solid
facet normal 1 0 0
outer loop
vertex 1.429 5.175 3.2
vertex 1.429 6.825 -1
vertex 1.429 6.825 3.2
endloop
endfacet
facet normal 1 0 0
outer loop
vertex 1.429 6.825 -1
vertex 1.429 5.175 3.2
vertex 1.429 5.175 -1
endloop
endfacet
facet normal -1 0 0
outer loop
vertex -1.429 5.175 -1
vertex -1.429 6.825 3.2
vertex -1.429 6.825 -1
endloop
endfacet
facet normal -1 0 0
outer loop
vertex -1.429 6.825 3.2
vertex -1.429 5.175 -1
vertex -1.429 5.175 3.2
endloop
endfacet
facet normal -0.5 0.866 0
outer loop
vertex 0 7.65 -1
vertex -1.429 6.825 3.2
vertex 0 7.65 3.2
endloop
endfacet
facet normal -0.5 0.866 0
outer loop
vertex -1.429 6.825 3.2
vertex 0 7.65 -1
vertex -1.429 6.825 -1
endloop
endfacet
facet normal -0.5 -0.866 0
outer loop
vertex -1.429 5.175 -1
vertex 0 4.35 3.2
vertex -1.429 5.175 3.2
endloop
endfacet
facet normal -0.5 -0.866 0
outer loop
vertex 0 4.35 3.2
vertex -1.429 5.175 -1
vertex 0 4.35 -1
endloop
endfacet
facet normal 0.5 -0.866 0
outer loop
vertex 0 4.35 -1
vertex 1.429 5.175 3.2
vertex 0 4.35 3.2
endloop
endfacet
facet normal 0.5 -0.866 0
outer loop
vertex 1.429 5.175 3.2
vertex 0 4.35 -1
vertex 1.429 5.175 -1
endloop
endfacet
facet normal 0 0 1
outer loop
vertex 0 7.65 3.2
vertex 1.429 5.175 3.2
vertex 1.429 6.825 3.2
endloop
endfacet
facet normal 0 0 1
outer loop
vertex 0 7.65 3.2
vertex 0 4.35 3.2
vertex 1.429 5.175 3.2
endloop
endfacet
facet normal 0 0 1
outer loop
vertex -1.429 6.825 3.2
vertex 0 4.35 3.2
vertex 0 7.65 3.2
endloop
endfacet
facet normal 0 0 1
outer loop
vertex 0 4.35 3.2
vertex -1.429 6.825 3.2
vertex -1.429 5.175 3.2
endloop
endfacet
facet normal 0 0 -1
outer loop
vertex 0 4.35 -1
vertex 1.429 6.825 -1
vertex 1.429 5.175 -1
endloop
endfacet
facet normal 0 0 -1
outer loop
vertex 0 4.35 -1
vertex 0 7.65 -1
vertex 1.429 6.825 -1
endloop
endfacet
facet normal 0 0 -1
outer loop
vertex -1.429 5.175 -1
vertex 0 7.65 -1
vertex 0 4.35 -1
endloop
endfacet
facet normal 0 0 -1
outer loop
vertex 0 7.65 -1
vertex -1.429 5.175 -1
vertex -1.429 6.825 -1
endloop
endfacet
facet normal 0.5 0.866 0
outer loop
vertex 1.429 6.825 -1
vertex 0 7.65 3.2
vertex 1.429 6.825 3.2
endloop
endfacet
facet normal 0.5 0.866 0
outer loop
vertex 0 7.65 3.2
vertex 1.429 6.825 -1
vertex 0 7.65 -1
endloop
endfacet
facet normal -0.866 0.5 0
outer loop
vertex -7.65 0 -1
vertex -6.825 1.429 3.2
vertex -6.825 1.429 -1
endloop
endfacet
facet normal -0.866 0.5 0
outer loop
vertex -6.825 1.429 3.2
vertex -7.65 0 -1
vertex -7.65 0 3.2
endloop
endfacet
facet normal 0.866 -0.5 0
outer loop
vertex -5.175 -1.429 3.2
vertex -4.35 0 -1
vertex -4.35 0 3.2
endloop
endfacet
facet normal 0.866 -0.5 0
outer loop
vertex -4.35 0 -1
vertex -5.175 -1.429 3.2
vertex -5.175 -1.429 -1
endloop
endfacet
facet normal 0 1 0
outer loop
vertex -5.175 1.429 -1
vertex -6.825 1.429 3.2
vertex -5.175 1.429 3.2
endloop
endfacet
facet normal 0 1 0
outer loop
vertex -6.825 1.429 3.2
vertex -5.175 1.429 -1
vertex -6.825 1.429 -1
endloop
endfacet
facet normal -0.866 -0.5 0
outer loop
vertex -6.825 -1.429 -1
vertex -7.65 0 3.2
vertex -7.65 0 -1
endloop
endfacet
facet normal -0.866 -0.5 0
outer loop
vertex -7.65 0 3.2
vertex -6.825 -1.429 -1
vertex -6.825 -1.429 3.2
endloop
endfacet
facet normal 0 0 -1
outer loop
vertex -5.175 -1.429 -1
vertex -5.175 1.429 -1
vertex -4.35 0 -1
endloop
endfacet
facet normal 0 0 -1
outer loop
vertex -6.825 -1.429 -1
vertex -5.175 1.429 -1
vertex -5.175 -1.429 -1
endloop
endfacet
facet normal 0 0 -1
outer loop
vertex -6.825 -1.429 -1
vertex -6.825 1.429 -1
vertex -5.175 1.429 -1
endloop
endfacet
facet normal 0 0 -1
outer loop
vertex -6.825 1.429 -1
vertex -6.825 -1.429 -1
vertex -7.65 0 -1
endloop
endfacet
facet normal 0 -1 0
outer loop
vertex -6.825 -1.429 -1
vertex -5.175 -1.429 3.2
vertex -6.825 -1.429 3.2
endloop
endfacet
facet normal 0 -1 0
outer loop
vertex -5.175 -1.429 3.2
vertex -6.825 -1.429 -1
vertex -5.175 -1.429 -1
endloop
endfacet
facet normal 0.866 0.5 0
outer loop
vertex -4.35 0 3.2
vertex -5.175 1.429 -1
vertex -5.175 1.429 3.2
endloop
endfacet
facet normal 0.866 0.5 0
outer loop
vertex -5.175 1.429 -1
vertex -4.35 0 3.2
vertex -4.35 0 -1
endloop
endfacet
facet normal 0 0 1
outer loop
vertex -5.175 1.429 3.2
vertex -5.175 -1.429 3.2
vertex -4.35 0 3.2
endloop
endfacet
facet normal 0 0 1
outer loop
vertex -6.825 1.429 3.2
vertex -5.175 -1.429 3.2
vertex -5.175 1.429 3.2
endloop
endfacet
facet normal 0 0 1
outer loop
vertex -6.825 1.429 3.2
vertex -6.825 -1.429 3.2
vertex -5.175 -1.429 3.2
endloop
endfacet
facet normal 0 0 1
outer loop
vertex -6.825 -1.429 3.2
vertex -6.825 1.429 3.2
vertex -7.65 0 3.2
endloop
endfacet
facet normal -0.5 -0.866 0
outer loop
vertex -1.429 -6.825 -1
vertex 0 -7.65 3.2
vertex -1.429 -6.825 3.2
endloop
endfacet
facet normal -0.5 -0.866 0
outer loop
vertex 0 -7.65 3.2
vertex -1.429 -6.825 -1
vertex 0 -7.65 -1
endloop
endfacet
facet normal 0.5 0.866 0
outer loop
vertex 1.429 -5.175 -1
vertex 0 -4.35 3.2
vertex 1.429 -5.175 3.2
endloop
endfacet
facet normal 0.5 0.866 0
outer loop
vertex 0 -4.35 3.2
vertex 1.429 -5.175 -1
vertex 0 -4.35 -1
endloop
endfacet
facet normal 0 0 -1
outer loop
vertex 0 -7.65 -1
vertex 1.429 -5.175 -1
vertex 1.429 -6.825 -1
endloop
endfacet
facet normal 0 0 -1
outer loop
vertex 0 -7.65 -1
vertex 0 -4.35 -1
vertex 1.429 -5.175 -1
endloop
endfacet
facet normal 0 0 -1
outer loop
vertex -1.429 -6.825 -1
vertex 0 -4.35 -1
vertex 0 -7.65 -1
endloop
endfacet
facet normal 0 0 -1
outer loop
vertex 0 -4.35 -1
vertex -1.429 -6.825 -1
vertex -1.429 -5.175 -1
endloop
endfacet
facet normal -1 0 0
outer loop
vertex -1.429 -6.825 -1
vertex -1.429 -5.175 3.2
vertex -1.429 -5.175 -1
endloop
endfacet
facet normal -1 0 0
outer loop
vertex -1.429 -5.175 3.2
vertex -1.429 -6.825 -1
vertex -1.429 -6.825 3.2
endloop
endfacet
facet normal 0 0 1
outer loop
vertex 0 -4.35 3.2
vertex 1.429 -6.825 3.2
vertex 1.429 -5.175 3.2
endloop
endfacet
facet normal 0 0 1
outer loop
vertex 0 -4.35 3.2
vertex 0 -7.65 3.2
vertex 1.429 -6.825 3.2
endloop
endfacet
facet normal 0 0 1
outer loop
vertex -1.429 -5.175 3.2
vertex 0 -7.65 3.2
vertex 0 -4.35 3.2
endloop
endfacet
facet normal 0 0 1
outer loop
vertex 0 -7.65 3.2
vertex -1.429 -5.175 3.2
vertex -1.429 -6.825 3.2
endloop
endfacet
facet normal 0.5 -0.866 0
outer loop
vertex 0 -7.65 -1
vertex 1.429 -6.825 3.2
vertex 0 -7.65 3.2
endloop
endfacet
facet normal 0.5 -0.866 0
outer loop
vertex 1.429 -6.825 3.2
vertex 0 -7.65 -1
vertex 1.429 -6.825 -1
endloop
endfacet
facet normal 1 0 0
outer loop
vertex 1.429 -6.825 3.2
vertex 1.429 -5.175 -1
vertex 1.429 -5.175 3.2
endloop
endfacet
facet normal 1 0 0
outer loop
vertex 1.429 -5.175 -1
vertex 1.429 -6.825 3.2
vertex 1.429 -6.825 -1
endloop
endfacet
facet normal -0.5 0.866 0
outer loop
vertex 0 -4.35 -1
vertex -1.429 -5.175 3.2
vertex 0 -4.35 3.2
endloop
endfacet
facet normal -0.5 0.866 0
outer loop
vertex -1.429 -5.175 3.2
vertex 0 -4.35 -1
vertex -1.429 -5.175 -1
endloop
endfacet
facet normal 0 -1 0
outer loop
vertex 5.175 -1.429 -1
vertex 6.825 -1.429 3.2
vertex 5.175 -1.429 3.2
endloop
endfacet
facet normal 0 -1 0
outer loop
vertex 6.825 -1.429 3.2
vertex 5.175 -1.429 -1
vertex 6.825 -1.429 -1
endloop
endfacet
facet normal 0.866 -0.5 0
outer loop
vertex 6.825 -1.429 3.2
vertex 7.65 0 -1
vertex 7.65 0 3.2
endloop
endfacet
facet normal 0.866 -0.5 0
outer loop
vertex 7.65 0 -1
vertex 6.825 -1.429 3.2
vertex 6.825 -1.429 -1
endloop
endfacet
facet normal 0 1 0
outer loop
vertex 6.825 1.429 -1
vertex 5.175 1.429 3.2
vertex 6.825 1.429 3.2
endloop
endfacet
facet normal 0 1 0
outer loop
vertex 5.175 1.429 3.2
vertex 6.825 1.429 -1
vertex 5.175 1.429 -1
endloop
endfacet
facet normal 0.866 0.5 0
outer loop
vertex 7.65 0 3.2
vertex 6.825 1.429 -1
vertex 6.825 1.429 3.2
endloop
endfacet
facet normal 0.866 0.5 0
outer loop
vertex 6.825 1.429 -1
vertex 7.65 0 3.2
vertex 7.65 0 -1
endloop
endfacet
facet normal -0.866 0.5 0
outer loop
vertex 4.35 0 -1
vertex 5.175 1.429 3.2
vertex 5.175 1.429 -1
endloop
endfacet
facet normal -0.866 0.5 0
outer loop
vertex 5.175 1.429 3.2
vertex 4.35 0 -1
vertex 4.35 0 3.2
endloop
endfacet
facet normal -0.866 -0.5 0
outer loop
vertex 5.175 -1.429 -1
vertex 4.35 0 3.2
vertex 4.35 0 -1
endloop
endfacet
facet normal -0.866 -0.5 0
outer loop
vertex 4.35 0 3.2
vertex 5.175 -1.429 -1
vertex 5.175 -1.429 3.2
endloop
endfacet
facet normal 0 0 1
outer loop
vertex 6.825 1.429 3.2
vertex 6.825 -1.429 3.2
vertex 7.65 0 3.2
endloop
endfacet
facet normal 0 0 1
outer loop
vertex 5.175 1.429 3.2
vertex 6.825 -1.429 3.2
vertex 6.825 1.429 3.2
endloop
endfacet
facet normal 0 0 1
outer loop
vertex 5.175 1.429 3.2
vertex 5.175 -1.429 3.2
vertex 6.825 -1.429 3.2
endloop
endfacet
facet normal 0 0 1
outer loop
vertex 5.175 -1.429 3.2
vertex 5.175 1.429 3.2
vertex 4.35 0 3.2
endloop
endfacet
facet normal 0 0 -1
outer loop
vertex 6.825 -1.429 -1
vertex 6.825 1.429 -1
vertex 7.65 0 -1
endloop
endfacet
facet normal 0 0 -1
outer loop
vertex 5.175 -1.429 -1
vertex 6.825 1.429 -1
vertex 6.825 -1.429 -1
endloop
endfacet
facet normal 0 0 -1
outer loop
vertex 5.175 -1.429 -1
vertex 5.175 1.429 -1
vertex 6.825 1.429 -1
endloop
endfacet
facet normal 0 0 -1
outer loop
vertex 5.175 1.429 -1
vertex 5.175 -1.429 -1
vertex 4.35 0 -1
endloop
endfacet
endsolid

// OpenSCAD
module screws(count=4, radius=6, size=3.3, thickness=2.2)
{
	for (screw=[1:count]) {
		rotate([0,0,screw*360/count])
		translate([radius,0,-1])
		cylinder(d=size, h=thickness+2);
	}
}

screws();
